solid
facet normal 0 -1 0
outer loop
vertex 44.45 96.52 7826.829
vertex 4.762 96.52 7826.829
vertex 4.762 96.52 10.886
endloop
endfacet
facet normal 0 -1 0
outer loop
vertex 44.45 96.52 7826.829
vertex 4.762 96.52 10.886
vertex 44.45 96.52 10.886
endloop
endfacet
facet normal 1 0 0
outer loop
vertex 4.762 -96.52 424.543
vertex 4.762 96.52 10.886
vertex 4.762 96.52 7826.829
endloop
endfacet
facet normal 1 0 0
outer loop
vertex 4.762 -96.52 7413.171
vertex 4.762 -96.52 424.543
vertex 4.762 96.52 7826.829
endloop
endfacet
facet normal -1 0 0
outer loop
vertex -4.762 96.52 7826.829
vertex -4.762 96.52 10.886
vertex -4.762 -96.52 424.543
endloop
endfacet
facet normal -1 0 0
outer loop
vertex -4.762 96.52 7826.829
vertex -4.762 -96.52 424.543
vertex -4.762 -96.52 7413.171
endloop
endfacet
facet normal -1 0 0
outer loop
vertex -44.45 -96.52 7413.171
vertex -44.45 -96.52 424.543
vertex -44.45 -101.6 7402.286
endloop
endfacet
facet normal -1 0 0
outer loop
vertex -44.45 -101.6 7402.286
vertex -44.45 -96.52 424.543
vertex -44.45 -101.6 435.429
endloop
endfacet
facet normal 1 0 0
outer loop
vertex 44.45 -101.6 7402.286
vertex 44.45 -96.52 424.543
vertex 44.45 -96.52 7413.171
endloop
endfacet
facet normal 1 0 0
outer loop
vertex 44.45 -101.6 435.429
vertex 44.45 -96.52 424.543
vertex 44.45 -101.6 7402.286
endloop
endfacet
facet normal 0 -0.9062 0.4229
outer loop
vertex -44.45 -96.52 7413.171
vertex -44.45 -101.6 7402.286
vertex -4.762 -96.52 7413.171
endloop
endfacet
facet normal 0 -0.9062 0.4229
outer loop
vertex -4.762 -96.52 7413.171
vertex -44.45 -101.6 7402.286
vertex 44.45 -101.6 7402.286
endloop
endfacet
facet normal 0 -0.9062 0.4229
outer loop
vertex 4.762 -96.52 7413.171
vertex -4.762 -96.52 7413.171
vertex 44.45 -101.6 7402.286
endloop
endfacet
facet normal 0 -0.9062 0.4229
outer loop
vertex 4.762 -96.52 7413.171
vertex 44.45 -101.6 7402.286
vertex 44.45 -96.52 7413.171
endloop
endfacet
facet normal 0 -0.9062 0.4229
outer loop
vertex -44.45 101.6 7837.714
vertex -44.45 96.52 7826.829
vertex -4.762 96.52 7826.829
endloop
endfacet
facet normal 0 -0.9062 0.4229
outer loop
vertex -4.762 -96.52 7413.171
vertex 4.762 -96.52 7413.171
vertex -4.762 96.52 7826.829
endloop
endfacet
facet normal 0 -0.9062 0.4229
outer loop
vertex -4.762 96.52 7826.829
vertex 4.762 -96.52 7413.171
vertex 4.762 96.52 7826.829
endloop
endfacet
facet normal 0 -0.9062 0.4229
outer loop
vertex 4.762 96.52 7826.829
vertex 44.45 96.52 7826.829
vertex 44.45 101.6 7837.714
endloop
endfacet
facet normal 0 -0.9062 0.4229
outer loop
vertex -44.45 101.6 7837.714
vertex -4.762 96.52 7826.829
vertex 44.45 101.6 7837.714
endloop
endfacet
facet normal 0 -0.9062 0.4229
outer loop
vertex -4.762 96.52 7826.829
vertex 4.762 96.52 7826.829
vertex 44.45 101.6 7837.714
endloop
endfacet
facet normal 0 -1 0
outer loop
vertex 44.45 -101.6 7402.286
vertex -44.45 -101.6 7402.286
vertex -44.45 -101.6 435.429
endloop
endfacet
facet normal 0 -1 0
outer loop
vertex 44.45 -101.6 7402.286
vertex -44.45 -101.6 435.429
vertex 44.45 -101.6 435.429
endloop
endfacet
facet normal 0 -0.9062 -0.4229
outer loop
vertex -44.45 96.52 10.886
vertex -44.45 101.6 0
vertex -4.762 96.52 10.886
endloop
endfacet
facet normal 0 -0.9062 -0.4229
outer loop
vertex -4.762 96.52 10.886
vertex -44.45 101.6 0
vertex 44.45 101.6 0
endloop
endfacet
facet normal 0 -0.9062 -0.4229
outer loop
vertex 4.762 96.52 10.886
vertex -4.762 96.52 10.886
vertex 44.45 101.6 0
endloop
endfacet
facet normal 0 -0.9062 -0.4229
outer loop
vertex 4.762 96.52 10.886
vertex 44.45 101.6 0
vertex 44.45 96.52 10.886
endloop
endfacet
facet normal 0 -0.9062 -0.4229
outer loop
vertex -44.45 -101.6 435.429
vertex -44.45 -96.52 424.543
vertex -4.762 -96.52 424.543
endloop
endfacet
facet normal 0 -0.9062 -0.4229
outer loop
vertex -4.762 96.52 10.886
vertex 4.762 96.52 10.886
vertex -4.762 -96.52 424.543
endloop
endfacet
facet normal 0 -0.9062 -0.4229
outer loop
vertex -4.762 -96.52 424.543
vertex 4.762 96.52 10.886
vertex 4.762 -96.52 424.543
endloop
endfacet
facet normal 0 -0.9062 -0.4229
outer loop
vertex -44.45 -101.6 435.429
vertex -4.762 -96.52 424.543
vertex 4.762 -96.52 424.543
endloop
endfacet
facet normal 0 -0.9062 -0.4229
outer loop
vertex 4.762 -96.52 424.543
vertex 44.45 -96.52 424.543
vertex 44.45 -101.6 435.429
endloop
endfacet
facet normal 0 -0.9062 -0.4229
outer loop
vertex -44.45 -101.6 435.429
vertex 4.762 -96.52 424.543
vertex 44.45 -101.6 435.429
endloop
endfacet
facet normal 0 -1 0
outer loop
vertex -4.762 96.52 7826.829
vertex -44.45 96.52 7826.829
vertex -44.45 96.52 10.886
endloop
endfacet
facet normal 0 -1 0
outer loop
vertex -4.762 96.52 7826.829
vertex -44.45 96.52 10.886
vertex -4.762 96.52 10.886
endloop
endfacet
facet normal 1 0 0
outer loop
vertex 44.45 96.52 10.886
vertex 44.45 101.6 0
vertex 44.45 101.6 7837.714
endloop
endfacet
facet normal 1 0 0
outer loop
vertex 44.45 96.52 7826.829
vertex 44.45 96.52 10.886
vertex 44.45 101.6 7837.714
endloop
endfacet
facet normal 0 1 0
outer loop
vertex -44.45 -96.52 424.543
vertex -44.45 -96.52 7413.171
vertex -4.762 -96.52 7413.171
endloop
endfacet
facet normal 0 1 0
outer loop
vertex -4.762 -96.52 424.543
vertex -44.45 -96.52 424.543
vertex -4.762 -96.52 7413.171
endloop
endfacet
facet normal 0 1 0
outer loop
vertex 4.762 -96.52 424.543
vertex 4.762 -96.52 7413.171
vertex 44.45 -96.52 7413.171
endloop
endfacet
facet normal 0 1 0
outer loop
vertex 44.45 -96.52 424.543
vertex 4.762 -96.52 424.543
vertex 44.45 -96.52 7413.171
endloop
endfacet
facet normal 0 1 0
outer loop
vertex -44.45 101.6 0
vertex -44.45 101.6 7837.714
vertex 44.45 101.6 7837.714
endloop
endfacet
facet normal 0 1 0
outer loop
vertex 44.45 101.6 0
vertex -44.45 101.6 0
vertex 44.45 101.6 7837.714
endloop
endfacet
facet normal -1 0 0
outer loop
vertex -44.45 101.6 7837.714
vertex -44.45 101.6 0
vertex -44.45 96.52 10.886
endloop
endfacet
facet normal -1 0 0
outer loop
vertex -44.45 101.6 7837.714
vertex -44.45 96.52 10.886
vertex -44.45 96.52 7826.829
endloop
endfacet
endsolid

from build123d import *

# Parameters (mm, degrees)
F0_W     = 88.9
F0_H     = 203.2
F1_DEPTH = 10668
F2_W     = 39.6875
F2_H     = 193.04
F3_DEPTH = 10668.001
F5_DEPTH = 88.901


with BuildPart() as f1:
    # F0 (on Top) → F1 (new body)
    with BuildSketch(Plane.XY):
        Rectangle(F0_W, F0_H)
    extrude(amount=F1_DEPTH)

    # F2 (on Top) → F3 (cut, through all)
    with BuildSketch(Plane.XY):
        with Locations((-24.60625, 0)):
            Rectangle(F2_W, F2_H)
        with Locations((24.60625, 0)):
            Rectangle(F2_W, F2_H)
    extrude(amount=F3_DEPTH, mode=Mode.SUBTRACT)

    # F4 (on face) → F5 (cut, through all)
    with BuildSketch(Plane.YZ.offset(44.45)):
        Polygon((-1612.5576496124, 13062.8571428571), (-1727.2, 3918.8571428571), (-101.6, 7402.2857142857), (-101.6, 10668), (-96.52, 10668), (-96.52, 7413.1714285714), (2540, 13062.8571428571), align=None)
        Polygon((-101.6, 10668), (-101.6, 7402.2857142857), (-96.52, 7413.1714285714), (-96.52, 10668), align=None)
        Polygon((-101.6, 435.4285714286), (-1727.2, 3918.8571428571), (-1727.2, -5225.1428571429), (2540, -5225.1428571429), (-96.52, 424.5428571429), (-96.52, 0), (-101.6, 0), align=None)
        Polygon((-96.52, 424.5428571429), (-101.6, 435.4285714286), (-101.6, 0), (-96.52, 0), align=None)
    extrude(amount=-F5_DEPTH, mode=Mode.SUBTRACT)


solid = f1.part
